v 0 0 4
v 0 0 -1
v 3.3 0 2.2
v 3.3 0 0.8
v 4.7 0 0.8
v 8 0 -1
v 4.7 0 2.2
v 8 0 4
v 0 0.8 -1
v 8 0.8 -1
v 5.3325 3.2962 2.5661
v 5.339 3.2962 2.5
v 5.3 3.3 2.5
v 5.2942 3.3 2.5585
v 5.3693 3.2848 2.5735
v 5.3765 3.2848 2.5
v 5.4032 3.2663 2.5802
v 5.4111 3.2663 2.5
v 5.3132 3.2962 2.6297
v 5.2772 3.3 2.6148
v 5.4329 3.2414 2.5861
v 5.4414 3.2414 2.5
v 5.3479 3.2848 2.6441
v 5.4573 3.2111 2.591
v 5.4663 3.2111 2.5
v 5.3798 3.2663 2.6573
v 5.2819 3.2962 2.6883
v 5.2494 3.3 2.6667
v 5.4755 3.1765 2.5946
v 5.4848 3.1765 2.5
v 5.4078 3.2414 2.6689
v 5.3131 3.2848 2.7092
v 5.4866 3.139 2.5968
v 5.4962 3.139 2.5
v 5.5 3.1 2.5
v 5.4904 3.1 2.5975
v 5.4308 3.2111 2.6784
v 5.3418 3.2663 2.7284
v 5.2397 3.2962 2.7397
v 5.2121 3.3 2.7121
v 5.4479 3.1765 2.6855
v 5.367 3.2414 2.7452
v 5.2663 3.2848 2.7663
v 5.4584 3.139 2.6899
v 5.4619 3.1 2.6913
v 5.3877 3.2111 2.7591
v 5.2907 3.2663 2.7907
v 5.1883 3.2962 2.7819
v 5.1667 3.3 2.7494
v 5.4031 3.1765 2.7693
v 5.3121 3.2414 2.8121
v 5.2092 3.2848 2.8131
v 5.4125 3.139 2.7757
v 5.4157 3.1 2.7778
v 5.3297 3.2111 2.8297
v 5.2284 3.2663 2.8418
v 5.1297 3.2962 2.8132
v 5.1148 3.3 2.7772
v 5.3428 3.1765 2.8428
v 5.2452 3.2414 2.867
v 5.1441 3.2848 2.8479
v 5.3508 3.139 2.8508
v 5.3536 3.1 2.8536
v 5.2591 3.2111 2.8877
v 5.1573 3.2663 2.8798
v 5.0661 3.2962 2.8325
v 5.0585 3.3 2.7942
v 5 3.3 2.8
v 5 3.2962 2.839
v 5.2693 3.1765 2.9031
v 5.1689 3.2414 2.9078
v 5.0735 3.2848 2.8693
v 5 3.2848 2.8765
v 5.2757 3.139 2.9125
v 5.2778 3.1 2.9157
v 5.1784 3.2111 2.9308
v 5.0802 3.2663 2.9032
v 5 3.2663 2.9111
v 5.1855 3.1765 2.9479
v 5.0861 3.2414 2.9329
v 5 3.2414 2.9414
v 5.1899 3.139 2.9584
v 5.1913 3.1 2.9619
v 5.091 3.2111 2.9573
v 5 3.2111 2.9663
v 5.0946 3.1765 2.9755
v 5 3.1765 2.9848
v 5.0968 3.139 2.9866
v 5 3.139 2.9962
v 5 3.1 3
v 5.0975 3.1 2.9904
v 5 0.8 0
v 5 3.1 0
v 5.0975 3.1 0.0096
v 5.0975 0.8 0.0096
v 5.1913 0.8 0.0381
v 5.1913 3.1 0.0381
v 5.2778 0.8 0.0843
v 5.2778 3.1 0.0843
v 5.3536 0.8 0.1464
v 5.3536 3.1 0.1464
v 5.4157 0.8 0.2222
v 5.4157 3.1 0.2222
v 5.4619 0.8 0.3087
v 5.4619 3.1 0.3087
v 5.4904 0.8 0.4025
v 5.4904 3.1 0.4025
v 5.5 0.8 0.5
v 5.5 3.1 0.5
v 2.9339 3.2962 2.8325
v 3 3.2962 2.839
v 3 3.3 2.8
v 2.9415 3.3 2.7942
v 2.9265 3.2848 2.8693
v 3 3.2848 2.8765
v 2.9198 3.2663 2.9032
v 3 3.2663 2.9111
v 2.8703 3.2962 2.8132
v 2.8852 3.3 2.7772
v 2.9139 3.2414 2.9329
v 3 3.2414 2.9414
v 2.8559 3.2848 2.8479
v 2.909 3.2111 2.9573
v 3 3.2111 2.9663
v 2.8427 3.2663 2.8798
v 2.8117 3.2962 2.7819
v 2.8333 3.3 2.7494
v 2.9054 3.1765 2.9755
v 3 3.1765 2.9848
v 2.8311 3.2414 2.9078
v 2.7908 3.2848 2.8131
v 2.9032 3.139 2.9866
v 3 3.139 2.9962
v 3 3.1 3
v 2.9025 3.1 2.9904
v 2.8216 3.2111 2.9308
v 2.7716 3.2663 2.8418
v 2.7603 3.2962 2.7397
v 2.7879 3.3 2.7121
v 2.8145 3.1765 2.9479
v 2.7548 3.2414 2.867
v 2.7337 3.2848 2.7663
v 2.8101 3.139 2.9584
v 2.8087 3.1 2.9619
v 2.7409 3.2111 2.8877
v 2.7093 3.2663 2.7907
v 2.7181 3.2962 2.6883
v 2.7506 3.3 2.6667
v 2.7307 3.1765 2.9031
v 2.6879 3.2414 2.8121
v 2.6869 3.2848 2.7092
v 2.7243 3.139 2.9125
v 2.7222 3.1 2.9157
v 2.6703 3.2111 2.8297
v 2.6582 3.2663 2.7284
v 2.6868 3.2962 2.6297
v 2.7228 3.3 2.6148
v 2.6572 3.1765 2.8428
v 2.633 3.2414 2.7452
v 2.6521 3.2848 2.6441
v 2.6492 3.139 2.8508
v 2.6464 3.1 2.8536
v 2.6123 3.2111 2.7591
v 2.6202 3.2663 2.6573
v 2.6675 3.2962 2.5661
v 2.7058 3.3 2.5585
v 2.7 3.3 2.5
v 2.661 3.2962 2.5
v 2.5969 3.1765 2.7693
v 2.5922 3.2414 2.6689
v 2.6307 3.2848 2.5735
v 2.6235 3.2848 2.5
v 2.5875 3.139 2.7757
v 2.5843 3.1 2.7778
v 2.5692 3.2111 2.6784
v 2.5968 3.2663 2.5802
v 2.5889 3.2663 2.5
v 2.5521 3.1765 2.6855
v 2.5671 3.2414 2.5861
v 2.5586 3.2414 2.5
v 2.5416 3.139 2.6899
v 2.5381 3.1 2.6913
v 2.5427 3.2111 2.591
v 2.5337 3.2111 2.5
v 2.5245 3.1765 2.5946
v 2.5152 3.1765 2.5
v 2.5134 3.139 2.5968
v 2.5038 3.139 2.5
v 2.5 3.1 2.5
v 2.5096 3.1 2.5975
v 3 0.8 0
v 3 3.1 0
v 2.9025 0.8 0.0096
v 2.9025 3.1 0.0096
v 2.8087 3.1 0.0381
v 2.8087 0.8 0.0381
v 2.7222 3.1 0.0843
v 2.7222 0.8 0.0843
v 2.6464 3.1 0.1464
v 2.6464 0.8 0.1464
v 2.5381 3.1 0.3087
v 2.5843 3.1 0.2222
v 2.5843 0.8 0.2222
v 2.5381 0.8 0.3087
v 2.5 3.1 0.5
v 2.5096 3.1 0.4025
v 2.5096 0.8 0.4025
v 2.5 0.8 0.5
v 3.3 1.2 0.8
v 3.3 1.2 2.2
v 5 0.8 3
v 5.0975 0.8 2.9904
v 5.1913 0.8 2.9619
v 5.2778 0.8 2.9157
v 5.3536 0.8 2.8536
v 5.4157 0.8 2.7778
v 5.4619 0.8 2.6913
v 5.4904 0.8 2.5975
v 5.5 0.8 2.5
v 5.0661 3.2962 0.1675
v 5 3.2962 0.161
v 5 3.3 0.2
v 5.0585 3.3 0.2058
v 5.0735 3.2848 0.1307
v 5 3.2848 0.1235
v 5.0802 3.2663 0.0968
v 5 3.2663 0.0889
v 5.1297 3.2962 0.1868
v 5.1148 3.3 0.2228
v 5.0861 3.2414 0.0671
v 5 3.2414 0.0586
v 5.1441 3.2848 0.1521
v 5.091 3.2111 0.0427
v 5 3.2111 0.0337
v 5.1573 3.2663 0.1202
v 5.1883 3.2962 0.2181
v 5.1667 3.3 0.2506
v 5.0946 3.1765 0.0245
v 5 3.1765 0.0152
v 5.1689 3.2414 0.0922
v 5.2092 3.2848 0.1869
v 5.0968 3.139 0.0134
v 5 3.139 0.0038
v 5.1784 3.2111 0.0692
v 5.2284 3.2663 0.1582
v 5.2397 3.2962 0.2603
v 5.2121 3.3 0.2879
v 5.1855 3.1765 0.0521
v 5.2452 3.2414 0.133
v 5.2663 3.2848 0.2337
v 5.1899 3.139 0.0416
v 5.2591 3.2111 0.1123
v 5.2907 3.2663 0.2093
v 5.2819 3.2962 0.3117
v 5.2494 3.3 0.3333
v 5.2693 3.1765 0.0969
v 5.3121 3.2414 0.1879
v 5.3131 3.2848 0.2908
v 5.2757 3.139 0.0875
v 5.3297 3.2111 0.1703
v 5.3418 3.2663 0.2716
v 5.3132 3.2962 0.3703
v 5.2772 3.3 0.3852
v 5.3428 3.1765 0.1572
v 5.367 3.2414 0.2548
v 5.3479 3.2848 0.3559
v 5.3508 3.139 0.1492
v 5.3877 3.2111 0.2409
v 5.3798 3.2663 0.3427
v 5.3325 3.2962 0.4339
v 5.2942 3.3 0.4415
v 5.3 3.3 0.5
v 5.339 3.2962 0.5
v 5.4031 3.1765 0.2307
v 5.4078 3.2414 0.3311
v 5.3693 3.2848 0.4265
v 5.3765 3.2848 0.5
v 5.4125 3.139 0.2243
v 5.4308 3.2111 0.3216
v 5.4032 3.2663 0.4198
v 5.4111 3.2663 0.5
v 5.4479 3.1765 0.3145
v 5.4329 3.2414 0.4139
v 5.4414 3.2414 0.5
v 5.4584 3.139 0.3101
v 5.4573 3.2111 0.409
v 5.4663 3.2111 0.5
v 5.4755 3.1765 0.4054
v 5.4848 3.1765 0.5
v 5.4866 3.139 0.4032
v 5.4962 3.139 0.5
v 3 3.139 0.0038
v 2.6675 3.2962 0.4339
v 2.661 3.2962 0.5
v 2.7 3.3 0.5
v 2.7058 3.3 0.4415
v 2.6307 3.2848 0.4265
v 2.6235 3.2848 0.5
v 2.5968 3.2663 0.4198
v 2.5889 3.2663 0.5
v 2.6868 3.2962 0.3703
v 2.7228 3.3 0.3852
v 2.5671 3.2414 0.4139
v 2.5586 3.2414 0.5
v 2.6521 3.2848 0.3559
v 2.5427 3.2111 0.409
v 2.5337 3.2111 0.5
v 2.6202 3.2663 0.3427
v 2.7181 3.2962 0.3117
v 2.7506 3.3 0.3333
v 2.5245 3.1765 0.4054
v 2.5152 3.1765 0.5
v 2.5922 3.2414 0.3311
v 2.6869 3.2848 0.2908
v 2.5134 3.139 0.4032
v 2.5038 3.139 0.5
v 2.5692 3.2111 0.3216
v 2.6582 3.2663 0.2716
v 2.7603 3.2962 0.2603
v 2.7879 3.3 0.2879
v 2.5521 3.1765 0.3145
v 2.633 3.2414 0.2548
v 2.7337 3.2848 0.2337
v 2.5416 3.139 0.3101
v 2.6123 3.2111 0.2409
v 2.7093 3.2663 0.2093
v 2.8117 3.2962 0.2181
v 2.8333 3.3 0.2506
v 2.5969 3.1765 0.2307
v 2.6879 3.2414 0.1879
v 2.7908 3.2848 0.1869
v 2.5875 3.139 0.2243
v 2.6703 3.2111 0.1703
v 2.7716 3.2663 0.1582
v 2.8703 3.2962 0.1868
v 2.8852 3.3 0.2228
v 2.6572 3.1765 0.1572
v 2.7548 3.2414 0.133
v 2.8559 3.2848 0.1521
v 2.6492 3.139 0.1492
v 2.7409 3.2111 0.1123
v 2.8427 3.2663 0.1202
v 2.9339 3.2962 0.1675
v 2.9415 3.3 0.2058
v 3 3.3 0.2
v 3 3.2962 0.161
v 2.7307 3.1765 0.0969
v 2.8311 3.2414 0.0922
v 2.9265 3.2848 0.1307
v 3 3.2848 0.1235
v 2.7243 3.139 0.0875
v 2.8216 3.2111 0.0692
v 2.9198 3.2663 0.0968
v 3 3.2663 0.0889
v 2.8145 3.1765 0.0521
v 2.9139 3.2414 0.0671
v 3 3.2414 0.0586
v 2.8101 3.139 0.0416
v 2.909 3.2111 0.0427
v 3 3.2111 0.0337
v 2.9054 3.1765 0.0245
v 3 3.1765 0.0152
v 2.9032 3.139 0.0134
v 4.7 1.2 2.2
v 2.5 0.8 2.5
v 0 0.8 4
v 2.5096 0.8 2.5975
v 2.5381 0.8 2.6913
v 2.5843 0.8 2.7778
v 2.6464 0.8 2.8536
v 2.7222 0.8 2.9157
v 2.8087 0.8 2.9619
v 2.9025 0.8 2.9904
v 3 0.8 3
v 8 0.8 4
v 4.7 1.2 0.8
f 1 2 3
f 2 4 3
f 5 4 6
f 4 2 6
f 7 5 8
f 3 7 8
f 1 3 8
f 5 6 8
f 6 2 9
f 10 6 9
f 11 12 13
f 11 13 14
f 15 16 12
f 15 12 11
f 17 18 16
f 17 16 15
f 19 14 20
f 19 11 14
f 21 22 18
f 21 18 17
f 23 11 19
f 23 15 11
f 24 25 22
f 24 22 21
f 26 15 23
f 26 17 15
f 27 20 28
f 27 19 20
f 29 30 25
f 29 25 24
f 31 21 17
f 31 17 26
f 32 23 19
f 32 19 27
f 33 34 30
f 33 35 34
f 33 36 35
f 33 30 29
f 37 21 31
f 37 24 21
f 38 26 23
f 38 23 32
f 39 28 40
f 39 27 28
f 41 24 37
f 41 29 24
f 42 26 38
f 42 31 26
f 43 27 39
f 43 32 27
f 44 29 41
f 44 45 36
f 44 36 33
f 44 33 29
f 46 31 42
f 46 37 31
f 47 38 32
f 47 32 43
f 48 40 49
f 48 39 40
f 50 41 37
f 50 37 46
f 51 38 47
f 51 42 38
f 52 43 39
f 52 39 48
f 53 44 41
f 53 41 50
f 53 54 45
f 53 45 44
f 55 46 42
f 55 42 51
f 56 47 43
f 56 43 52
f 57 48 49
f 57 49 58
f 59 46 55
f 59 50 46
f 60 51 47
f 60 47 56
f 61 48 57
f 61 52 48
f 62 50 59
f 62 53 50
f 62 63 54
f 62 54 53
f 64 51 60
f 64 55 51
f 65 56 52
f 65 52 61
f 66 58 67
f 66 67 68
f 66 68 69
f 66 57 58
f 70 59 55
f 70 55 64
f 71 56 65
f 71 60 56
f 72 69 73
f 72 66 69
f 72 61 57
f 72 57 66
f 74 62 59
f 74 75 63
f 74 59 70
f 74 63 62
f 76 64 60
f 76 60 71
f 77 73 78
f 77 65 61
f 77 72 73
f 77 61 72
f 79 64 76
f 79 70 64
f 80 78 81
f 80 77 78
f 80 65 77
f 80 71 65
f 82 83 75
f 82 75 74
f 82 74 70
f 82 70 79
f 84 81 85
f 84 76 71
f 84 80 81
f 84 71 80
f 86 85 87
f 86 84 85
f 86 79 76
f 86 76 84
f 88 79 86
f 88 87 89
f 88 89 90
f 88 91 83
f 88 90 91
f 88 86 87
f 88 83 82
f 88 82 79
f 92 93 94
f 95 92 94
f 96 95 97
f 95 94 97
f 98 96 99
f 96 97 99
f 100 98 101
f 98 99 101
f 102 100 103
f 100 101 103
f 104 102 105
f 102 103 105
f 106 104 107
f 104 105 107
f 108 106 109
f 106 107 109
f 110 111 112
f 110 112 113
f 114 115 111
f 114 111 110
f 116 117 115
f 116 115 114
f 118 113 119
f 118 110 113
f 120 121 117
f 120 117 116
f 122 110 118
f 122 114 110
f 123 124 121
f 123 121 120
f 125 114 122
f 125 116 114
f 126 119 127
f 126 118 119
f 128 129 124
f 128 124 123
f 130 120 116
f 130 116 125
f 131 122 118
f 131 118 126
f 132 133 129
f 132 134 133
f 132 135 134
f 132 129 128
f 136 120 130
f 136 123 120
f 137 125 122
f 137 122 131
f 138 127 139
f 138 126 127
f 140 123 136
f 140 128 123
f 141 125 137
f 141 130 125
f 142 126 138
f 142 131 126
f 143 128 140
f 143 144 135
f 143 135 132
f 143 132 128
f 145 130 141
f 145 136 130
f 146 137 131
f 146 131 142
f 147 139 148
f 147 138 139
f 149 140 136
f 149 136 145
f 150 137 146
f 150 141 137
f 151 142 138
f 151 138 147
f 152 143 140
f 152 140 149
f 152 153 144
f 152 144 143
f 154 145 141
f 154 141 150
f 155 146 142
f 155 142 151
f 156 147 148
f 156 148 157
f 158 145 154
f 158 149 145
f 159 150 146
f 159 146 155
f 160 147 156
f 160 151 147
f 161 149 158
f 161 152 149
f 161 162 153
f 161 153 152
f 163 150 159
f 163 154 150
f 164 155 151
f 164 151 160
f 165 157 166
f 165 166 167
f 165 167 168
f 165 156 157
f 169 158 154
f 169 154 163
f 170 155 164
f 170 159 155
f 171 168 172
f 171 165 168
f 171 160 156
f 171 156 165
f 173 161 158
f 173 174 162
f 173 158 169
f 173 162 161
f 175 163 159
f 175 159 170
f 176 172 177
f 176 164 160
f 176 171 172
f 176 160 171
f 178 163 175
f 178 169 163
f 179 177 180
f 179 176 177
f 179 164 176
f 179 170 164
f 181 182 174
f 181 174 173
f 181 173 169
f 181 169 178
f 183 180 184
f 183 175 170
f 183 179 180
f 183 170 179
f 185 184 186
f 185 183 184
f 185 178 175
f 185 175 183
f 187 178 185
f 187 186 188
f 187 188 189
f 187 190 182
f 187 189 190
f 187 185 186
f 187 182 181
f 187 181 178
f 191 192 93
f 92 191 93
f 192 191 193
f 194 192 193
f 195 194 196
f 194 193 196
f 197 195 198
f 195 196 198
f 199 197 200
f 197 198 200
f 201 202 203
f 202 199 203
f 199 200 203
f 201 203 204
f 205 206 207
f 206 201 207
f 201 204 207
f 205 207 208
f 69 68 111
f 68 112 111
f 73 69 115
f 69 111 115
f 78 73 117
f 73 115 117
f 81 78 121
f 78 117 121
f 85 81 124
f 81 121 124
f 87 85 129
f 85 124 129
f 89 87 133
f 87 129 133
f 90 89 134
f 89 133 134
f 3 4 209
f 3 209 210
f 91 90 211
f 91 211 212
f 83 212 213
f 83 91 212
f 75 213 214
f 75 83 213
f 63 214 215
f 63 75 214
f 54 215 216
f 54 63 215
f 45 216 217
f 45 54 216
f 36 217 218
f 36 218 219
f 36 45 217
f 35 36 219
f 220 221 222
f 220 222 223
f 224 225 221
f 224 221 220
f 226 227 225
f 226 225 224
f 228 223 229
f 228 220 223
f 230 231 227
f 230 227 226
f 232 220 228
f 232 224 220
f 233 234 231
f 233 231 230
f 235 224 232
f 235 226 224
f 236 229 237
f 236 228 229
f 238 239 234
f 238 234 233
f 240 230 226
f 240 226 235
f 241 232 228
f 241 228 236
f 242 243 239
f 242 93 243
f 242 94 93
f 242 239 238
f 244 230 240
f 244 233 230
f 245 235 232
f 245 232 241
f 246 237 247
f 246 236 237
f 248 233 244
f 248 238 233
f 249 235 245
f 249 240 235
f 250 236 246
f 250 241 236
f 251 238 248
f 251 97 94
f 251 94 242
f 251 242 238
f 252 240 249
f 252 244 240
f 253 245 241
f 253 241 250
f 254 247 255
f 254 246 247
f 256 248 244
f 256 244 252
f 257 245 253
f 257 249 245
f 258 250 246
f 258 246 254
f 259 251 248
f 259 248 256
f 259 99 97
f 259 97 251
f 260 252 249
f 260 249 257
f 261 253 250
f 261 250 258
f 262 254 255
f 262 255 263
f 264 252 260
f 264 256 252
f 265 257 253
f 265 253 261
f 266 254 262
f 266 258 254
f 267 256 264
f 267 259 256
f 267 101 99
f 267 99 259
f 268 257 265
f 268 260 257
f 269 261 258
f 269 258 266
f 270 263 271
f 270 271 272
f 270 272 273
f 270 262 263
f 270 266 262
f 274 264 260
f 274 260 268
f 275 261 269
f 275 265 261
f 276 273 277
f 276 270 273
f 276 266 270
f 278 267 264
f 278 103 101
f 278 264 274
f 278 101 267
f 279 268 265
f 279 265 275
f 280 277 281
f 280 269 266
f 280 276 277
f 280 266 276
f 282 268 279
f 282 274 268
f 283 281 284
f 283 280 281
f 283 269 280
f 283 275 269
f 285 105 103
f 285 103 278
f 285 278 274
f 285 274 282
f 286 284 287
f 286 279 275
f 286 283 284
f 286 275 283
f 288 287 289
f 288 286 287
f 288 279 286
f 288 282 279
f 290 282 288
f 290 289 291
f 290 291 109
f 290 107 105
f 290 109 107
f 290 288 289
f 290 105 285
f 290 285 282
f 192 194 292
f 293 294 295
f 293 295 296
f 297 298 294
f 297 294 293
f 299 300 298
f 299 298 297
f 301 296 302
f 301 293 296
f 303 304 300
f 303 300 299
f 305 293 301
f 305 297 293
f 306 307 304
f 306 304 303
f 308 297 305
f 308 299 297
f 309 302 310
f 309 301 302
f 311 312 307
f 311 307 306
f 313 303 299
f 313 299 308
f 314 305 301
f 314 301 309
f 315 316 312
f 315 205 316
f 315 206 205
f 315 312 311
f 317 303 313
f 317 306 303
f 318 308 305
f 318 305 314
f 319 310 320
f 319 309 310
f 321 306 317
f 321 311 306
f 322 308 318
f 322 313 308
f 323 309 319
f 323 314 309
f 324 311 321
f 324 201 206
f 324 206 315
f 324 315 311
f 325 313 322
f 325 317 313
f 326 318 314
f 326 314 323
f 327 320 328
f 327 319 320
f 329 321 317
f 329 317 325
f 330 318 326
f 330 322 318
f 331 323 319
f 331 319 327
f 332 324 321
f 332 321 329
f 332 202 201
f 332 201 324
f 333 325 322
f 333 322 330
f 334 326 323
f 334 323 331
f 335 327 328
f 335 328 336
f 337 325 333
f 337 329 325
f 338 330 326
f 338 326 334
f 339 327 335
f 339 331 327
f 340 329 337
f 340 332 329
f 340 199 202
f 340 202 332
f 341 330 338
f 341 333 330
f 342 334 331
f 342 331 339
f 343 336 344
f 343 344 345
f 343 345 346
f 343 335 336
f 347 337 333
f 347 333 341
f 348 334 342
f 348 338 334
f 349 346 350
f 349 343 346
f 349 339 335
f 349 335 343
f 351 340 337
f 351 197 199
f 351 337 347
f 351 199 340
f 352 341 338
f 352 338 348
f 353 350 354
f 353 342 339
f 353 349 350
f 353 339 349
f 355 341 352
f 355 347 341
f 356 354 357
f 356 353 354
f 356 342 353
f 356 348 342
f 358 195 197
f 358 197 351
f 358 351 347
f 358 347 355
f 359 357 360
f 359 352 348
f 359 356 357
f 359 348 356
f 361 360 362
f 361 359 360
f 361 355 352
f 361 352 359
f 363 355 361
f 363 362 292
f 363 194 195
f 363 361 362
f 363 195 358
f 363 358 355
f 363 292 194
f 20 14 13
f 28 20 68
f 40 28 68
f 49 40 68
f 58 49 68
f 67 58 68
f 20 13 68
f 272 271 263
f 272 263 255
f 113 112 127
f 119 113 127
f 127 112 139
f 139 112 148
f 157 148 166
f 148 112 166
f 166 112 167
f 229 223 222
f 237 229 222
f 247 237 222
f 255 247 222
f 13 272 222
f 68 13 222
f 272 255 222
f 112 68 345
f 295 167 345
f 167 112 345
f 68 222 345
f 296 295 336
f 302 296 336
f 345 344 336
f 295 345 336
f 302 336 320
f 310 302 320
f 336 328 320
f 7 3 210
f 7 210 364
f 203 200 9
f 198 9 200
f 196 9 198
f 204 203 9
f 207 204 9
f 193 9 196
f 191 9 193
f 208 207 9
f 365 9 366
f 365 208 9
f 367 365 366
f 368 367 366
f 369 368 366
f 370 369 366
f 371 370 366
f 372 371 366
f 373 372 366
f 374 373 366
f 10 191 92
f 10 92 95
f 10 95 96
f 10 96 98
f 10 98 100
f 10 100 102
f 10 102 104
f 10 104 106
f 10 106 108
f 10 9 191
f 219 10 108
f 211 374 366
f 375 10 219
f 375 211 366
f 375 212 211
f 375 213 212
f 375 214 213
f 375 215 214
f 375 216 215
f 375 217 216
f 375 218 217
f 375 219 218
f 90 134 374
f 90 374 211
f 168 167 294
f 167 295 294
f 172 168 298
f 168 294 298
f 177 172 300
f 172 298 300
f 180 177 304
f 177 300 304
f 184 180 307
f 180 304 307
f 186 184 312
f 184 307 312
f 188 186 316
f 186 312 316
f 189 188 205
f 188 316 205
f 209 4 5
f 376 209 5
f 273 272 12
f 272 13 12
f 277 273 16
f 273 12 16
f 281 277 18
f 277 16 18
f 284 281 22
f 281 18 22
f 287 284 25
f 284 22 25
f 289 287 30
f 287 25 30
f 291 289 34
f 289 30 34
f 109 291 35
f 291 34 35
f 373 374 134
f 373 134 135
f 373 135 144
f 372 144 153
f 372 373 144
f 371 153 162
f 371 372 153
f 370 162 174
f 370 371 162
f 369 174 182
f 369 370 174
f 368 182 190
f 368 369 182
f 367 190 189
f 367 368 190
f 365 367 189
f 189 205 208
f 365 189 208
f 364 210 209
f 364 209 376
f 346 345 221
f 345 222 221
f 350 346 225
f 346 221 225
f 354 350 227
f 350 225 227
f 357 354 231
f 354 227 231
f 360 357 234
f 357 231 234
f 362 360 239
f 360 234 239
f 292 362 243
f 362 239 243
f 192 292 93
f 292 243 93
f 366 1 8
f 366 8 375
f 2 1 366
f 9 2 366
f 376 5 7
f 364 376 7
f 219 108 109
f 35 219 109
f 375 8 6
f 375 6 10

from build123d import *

# Parameters (mm, degrees)
F1_DEPTH = 3
F2_W     = 1.4
F2_H     = 1.4
F3_DEPTH = 1.2
F4_R     = 0.5
F5_R     = 0.2
F6_W     = 0.8
F6_H     = 1
F7_DEPTH = 8


with BuildPart() as f1:
    # F0 (on Top) → F1 (new body)
    with BuildSketch(Plane.XY):
        Polygon((0, 0.8), (0, 0), (8, 0), (8, 0.8), (5.5, 0.8), (5.5, 3.3), (2.5, 3.3), (2.5, 0.8), align=None)
    extrude(amount=F1_DEPTH)

    # F2 (on face) → F3 (cut)
    with BuildSketch(Plane.XZ):
        with Locations((4, 1.5)):
            Rectangle(F2_W, F2_H)
    extrude(amount=-F3_DEPTH, mode=Mode.SUBTRACT)

    # F4
    f4_edges = [f1.edges().sort_by_distance(p)[0] for p in [
        (5.5, 2.05, 3),
        (2.5, 2.05, 3),
        (2.5, 2.05, 0),
        (5.5, 2.05, 0),
    ]]
    fillet(f4_edges, radius=F4_R)

    # F5
    f5_edges = [f1.edges().sort_by_distance(p)[0] for p in [
        (4, 3.3, 3),
        (5.353553, 3.3, 2.853553),
        (5.5, 3.3, 1.5),
        (5.353553, 3.3, 0.146447),
        (4, 3.3, 0),
        (2.646447, 3.3, 0.146447),
        (2.5, 3.3, 1.5),
        (2.646447, 3.3, 2.853553),
    ]]
    fillet(f5_edges, radius=F5_R)

    # F6 (on face) → F7 (join, through all)
    with BuildSketch(Plane.YZ.offset(8)):
        with Locations((0.4, 3.5)):
            Rectangle(F6_W, F6_H)
        with Locations((0.4, -0.5)):
            Rectangle(F6_W, F6_H)
    extrude(amount=-F7_DEPTH)


solid = f1.part
